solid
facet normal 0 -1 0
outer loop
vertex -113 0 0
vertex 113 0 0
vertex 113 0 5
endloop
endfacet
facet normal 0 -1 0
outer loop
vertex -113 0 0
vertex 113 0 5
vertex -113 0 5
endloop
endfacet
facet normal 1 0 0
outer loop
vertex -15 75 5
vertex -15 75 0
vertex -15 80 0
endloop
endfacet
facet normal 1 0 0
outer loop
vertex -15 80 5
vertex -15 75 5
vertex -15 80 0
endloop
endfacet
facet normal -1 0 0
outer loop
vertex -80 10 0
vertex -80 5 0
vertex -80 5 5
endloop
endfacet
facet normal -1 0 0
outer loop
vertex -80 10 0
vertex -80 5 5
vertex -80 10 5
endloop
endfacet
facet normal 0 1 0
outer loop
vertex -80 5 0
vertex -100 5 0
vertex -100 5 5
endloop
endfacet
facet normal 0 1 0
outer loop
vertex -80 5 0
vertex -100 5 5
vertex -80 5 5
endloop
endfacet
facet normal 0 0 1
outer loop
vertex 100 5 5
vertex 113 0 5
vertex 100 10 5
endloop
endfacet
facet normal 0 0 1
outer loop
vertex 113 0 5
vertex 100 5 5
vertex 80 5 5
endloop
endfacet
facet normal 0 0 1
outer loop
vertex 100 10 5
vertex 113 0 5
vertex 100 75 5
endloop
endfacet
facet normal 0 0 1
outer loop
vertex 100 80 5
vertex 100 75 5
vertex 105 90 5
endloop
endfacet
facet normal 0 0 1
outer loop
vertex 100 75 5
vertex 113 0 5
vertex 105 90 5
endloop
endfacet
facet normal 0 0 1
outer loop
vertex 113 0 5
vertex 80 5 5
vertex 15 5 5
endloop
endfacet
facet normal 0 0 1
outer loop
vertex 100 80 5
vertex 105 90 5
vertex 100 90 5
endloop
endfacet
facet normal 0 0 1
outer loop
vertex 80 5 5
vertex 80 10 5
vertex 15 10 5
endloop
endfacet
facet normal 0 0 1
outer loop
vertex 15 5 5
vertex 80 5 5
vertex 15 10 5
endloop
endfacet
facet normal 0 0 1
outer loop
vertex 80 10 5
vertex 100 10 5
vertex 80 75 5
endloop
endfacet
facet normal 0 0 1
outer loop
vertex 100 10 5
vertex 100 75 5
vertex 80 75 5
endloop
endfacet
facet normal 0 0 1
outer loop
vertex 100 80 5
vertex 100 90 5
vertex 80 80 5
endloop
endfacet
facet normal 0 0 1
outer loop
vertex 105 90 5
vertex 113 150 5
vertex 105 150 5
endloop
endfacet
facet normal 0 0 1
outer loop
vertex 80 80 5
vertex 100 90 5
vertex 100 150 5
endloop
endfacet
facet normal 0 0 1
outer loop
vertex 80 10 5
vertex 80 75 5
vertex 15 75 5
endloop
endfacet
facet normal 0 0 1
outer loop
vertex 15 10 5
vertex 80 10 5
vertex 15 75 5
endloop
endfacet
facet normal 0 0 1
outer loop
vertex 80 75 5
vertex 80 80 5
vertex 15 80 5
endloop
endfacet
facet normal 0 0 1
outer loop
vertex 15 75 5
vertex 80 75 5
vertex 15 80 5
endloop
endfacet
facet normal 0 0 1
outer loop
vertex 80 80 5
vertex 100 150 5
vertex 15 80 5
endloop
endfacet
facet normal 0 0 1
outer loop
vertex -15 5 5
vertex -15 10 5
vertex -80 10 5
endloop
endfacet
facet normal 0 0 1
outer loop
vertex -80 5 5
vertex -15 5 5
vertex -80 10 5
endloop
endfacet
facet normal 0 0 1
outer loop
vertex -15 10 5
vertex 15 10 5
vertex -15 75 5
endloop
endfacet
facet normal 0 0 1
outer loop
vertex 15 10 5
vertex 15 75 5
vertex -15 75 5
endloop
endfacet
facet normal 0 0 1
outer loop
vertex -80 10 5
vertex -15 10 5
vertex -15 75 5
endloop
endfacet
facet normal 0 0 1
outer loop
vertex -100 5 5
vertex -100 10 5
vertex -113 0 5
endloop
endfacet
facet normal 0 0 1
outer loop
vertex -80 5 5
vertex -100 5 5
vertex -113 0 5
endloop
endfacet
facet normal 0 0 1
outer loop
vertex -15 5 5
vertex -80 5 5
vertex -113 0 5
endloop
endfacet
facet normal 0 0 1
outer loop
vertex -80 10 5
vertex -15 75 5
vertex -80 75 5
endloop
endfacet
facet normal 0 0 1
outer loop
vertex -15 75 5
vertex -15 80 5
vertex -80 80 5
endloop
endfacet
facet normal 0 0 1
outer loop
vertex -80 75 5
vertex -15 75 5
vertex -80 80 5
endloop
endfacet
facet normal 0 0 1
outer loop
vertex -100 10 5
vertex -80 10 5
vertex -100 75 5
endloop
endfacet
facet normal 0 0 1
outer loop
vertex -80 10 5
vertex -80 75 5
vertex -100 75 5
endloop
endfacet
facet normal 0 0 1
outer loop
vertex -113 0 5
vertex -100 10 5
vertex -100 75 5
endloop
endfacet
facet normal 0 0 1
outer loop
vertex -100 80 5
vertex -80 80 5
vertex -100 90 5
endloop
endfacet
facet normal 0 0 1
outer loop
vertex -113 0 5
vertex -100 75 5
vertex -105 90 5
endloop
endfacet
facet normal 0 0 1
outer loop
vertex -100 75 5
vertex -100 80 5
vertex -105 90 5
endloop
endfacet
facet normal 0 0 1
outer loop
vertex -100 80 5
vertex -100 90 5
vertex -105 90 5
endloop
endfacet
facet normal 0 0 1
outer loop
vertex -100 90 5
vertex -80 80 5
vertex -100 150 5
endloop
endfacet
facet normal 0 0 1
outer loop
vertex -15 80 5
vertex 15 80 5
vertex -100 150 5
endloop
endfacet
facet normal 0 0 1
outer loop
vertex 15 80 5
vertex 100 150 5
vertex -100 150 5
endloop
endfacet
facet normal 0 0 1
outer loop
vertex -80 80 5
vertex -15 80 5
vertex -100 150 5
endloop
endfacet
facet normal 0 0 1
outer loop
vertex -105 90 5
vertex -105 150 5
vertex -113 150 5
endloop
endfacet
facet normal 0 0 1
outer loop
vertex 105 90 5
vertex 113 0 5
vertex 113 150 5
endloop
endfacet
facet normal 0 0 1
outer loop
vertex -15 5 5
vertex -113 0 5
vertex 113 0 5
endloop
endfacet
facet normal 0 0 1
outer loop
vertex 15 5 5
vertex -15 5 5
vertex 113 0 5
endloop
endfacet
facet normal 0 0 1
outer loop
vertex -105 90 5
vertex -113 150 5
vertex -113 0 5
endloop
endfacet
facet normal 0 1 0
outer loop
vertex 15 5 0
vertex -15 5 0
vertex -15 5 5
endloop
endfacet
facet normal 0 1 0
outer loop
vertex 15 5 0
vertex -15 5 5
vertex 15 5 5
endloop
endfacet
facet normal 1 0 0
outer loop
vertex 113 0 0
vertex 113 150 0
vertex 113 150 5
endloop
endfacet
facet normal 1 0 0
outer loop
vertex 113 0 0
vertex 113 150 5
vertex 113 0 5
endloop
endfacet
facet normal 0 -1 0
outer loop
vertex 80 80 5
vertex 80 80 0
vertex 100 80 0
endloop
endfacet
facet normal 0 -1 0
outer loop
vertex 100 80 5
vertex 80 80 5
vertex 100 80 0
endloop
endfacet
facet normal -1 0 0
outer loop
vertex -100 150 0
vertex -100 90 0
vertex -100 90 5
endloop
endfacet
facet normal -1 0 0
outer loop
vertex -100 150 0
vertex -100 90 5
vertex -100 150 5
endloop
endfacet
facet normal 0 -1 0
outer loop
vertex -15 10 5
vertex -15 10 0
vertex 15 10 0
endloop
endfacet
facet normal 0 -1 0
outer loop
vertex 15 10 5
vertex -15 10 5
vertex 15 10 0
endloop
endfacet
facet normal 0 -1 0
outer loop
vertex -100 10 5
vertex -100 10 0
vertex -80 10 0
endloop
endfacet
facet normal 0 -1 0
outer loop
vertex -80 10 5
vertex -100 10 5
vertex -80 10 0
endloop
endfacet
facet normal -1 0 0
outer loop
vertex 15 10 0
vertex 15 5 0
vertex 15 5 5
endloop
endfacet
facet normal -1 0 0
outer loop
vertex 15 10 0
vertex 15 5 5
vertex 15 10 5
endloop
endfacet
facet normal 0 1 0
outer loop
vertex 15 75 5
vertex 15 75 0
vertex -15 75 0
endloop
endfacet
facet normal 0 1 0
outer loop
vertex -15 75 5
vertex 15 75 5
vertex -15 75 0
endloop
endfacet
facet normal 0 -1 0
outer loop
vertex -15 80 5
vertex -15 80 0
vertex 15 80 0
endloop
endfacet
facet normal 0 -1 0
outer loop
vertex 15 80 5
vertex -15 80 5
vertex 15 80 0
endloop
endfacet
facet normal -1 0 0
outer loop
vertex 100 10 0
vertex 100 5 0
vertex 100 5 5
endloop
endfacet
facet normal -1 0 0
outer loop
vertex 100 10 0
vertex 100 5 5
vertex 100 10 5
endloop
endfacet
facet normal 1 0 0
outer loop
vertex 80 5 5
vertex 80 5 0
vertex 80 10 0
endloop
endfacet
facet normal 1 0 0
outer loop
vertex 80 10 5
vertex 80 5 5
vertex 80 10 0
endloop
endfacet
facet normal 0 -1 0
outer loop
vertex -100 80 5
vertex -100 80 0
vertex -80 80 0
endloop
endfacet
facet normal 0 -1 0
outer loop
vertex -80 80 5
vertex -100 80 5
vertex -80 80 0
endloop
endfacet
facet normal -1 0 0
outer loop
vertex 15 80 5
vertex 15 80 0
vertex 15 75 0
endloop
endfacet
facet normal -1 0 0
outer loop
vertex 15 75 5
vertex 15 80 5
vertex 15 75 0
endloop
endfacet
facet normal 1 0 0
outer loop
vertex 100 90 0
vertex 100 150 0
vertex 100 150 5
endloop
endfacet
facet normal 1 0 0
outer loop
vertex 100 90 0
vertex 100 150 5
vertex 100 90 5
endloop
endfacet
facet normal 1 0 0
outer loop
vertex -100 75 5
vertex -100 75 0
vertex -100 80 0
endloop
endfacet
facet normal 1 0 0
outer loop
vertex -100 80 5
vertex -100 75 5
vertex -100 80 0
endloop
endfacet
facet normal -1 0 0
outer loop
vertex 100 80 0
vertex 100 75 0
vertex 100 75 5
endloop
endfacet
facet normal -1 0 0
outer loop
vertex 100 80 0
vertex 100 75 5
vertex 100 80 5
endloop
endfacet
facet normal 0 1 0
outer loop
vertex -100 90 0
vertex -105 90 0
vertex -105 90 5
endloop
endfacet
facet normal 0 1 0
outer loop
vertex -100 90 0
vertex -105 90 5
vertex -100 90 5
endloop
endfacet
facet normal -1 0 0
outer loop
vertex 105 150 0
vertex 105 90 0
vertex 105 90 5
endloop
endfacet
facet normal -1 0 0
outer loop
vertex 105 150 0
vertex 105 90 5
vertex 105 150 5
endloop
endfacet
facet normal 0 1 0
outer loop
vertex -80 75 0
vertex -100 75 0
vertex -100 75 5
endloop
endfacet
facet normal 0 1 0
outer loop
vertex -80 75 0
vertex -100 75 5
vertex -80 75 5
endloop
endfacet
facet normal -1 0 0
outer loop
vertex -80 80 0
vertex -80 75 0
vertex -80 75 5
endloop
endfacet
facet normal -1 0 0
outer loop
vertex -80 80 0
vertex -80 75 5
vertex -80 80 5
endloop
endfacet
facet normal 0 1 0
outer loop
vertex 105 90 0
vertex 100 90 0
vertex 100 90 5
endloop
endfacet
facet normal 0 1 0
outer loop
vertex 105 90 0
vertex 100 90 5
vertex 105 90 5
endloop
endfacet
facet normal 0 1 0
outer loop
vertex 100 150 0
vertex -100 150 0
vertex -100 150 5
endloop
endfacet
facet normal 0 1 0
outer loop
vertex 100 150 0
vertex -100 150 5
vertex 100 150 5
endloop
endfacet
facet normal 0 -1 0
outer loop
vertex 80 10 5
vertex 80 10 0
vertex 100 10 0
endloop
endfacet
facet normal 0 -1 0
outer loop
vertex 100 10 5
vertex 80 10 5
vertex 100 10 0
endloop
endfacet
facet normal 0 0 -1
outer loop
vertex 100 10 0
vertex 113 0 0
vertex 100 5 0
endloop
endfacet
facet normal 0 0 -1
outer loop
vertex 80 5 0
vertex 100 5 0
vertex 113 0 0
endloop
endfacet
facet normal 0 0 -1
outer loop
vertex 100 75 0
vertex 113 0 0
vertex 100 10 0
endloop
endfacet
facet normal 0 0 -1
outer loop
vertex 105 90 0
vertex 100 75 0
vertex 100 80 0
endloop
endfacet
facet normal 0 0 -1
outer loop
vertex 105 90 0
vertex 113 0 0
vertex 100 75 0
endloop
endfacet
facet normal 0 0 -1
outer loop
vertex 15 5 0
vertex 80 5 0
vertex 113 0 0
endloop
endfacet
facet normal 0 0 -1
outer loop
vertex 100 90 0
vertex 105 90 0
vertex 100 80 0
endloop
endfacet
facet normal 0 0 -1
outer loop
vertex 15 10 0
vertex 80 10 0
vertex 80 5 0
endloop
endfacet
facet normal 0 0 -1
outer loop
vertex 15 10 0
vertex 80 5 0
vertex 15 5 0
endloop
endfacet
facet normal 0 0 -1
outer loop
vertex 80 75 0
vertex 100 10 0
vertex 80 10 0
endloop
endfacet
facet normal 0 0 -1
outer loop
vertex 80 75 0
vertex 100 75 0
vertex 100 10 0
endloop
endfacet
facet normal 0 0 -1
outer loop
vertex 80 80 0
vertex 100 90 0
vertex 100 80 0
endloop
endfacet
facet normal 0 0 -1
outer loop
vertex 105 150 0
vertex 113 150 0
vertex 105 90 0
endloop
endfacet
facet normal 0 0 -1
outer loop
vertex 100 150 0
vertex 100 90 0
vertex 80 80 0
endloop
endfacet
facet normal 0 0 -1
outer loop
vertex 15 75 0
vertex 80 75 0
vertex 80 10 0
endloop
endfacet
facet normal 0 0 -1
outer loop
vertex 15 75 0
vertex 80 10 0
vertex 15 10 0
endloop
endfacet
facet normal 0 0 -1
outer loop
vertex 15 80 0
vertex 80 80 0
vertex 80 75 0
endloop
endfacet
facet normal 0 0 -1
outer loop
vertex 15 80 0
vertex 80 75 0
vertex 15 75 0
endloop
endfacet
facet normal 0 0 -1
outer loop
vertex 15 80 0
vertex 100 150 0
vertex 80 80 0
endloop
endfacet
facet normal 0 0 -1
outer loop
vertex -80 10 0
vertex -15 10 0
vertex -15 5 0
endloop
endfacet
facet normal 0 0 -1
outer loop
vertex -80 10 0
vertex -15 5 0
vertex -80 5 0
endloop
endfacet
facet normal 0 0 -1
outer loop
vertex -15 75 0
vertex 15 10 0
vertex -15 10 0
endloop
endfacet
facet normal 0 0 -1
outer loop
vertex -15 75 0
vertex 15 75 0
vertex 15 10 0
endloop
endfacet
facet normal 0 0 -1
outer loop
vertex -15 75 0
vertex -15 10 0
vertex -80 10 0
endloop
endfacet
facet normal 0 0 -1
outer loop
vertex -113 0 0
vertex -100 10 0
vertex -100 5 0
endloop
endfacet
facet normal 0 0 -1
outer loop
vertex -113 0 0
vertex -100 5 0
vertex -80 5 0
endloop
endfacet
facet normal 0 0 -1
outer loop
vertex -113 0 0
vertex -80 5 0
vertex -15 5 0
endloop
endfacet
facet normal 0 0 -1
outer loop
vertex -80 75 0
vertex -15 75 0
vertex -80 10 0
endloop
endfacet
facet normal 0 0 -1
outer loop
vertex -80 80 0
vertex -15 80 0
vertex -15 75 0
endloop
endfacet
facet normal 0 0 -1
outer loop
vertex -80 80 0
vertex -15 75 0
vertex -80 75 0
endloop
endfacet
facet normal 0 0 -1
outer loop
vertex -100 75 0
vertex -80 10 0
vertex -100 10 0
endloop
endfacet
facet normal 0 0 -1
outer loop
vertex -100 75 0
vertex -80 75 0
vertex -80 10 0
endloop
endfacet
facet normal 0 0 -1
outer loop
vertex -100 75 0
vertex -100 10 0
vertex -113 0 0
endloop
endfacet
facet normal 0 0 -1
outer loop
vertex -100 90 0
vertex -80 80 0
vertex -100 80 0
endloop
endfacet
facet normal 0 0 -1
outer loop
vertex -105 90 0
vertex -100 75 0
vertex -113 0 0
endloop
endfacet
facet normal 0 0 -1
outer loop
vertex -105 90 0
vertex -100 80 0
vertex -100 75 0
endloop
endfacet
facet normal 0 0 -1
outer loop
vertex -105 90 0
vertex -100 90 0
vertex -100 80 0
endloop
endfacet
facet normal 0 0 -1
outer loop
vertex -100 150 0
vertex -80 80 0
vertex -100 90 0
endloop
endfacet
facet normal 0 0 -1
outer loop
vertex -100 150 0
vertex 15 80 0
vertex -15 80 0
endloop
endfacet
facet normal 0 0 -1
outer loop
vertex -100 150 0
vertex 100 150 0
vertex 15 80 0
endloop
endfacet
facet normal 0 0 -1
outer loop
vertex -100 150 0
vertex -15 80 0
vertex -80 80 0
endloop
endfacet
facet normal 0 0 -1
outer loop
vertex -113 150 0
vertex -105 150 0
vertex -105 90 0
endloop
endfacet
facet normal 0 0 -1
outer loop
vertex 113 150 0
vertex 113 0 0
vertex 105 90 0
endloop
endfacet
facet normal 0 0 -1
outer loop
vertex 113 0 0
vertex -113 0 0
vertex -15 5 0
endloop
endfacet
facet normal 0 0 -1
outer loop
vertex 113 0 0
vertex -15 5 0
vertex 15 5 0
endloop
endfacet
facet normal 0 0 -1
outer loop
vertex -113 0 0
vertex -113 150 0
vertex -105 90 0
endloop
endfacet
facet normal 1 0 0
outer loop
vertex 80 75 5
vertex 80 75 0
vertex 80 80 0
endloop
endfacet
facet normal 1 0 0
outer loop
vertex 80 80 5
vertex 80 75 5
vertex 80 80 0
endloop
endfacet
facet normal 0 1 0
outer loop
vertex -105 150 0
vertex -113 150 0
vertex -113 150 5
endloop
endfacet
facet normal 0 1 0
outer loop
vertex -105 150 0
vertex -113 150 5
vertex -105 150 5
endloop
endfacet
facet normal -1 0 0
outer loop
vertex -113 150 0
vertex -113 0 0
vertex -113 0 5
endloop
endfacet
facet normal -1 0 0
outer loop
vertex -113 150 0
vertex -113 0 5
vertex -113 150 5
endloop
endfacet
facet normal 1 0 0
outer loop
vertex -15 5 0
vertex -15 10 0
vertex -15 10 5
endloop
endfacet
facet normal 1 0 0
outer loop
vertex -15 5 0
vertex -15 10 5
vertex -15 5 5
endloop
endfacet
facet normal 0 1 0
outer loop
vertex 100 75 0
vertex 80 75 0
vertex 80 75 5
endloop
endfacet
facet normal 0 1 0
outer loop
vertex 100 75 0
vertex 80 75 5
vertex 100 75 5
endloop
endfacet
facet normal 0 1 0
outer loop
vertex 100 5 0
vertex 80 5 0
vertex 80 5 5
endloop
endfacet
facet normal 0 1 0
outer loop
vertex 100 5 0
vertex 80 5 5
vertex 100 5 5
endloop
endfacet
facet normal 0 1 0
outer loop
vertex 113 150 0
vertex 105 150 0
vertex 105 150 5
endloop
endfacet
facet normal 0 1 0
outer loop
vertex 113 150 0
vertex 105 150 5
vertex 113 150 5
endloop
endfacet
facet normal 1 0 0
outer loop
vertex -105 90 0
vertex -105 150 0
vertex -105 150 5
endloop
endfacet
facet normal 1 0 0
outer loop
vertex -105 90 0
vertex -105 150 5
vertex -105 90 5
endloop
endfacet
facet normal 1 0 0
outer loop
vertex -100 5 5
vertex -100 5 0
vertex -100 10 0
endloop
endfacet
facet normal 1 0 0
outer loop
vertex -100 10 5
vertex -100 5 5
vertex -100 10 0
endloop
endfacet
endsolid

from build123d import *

# Parameters (mm, degrees)
ESQUISSE1_W        = 20
ESQUISSE1_H        = 5
BOSS_EXTRU_1_DEPTH = 5


with BuildPart() as part:
    # Esquisse1 → Boss.-Extru.1 (new body)
    with BuildSketch(Plane.XY):
        Polygon((-100, 150), (100, 150), (100, 90), (105, 90), (105, 150), (113, 150), (113, 0), (-113, 0), (-113, 150), (-105, 150), (-105, 90), (-100, 90), align=None)
        with Locations((90, 7.5)):
            Rectangle(ESQUISSE1_W, ESQUISSE1_H, mode=Mode.SUBTRACT)
        with Locations((90, 77.5)):
            Rectangle(ESQUISSE1_W, ESQUISSE1_H, mode=Mode.SUBTRACT)
        Polygon((-15, 5), (15, 5), (15, 10), (0, 10), (-15, 10), align=None, mode=Mode.SUBTRACT)
        Polygon((-15, 80), (0, 80), (15, 80), (15, 75), (-15, 75), align=None, mode=Mode.SUBTRACT)
        with Locations((-90, 7.5)):
            Rectangle(ESQUISSE1_W, ESQUISSE1_H, mode=Mode.SUBTRACT)
        with Locations((-90, 77.5)):
            Rectangle(ESQUISSE1_W, ESQUISSE1_H, mode=Mode.SUBTRACT)
    extrude(amount=BOSS_EXTRU_1_DEPTH)


solid = part.part
